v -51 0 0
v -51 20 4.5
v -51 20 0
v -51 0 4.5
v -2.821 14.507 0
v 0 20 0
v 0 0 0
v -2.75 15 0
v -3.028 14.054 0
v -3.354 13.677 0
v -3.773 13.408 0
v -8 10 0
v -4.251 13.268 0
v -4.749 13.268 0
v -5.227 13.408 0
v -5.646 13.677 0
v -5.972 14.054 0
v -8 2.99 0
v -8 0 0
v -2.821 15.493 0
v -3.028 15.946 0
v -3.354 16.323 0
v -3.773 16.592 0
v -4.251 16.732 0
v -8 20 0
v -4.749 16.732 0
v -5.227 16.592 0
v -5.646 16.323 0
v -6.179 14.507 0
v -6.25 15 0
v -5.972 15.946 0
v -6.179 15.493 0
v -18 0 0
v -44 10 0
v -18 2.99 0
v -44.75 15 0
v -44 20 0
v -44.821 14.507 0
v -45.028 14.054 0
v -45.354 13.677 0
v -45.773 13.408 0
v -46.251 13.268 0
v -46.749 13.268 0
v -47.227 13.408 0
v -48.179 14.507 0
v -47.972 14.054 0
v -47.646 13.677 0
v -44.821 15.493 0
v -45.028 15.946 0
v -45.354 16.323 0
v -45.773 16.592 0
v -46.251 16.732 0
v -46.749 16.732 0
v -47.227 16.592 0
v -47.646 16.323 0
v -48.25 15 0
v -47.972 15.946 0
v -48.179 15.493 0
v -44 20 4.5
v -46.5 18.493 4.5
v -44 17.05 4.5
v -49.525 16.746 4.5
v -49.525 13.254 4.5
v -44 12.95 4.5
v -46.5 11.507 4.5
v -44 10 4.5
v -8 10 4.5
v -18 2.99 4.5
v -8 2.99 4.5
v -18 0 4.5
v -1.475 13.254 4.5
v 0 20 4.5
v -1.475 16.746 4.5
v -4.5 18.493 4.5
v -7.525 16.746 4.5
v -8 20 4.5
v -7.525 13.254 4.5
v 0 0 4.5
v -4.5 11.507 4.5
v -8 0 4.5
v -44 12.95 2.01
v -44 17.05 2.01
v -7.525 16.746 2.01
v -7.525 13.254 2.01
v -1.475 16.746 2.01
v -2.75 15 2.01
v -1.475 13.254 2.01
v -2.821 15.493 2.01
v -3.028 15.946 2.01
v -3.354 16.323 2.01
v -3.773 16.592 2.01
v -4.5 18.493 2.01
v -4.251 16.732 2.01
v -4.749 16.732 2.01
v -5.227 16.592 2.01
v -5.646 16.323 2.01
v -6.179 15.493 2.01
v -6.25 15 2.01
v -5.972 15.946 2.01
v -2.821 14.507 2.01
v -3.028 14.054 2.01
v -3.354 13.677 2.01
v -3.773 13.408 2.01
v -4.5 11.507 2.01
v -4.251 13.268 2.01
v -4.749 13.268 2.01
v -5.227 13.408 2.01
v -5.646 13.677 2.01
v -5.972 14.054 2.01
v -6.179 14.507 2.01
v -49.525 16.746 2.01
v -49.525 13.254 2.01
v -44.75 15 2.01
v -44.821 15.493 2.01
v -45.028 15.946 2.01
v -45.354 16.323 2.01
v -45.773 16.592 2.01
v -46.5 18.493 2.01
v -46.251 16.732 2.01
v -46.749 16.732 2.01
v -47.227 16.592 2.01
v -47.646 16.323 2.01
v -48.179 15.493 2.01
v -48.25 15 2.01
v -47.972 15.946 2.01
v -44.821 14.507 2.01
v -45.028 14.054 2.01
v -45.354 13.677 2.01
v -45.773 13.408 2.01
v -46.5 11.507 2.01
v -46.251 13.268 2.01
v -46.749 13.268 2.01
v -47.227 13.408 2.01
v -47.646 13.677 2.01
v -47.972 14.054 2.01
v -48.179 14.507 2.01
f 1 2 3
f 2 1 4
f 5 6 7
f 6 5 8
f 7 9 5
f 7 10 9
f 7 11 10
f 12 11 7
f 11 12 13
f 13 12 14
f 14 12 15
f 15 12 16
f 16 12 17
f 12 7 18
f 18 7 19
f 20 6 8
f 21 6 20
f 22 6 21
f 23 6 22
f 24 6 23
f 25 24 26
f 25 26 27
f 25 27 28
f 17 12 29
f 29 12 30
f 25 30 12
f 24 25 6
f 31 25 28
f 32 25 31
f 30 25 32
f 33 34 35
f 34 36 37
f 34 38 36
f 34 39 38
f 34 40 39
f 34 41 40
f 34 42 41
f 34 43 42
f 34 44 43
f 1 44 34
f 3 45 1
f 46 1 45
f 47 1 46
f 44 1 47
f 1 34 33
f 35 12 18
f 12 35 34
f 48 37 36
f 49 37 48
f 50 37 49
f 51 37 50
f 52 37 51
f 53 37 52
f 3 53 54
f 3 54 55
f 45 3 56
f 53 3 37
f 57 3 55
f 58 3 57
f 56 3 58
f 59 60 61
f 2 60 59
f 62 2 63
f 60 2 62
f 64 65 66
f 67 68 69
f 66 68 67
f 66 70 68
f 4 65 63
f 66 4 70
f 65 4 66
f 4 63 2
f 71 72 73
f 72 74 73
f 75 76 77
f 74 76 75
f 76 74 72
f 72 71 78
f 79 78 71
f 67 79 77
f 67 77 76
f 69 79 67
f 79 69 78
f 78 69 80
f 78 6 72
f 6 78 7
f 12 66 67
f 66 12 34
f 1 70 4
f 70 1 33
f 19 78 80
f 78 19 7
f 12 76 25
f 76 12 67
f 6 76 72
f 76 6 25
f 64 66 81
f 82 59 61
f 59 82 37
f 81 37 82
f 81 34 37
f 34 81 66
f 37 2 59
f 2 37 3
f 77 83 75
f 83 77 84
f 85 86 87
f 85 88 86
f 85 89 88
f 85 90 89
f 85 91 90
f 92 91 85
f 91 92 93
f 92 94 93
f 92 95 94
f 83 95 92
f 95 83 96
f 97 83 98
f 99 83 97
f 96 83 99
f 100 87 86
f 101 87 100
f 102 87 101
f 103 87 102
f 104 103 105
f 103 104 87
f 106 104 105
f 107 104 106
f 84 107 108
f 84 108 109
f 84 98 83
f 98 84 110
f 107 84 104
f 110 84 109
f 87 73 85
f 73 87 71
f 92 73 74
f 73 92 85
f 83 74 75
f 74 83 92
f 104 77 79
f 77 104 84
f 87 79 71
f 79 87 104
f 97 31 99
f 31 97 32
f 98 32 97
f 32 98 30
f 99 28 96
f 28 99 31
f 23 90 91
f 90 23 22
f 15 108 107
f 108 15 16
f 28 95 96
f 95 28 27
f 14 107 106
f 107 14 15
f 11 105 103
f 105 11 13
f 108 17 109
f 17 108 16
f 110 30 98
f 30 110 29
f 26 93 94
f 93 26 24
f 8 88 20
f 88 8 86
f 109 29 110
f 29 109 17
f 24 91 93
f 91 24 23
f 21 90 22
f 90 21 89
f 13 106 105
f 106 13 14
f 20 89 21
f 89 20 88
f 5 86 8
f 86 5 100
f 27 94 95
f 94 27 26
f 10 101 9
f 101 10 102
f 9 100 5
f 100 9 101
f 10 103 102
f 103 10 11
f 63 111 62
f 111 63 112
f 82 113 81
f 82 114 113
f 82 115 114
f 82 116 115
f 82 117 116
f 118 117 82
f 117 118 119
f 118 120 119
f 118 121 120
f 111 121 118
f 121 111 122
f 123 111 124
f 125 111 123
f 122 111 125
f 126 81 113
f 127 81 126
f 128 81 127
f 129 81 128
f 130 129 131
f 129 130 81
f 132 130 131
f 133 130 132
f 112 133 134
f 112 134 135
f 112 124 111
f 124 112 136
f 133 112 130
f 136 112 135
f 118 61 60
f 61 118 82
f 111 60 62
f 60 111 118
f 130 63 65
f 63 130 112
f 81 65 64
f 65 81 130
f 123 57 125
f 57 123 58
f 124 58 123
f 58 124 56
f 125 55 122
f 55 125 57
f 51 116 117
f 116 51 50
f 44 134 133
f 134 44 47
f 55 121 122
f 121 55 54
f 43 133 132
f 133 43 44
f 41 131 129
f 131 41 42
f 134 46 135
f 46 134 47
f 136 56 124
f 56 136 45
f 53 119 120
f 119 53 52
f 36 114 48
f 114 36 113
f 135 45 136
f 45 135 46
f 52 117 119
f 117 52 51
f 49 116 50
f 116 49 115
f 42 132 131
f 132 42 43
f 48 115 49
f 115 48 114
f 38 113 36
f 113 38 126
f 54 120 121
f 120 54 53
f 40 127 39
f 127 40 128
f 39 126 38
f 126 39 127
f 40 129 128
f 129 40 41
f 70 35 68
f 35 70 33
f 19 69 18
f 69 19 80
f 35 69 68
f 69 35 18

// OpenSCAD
// file: nuts.scad
e = 0.1; // epsilon

// Screws / Nuts
// described by a K-Element vector, offsets defined as follows
nut_diameter_low   = 0;
nut_diameter_high  = 1;
nut_height         = 2;
screw_channel      = 3;
screw_head_channel = 4;
screw_head_height  = 5;
m3 = [ 5.6,  6.5, 2.5, 3.5,  6.0, 2.5];
m4 = [ 7.0,  8.0, 3.5, 4.5,  7.5, 3.0];
m5 = [ 8.0,  9.2, 3.7, 5.0,  9.2, 3.5];
m6 = [10.0, 11.2, 5.0, 6.0, 10.1, 4.0];

module nut_hole (nut, h)
{
    w = (nut [nut_diameter_low] + nut [nut_diameter_high]) / 2;
    translate ([0, 0, h / 2]) difference () {
        cube ([w, 2*w, h], center = true);
        rotate ([0, 0, 30])
            translate ([0, 1.5 * w, 0])
                cube ([2*w, 2*w, h+e], center = true);
        rotate ([0, 0, -30])
            translate ([0, 1.5 * w, 0])
                cube ([2*w, 2*w, h+e], center = true);
        rotate ([0, 0, 30])
            translate ([0, -1.5 * w, 0])
                cube ([2*w, 2*w, h+e], center = true);
        rotate ([0, 0, -30])
            translate ([0, -1.5 * w, 0])
                cube ([2*w, 2*w, h+e], center = true);
    }
}

// A screw channel + cone for a sunk screw, with h2 it can be deeper
// h is the length of the screw, h2 is how far it is sunk in the cone
// height/width only depends on the given nut.
module countersunk_screw_hole (nut, h, h2 = 0)
{
    r2 = (nut [screw_channel] * 1.1) / 2;
    cylinder
        ( r1 = (nut [screw_head_channel] * 1.1) / 2
        , r2 = r2
        , h  = nut [screw_head_height]  * 1.05
        );
    cylinder (r = r2, h = h + nut [screw_head_height]);
    translate ([0, 0, -h2+e])
        cylinder (r = nut [screw_head_channel] * 1.1 / 2, h = h2);
}
//translate ([5, 0, 0])
//    countersunk_screw_hole (m5, 10, 10, $fa = 6, $fs = .5);

// A channel for a sideways embedded nut
// ehf is the factor for the embedded height for the hole of the nut, we
// make it a little wider than nut-height by default, but it can be
// overridden.
// ewf is the factor for the width of the hole (nut diameter * ewf)
module embedded_nut (nut, h, ehf=1.3, ewf=1)
{
    w = (nut [nut_diameter_low] + nut [nut_diameter_high]) / 2;
    union () {
        translate ([0, -w * ewf * 0.5, 0])
            cube ([nut [nut_height] * ehf, w * ewf, h]);
        rotate ([0, 90, 0]) rotate ([0, 0, 30])
            nut_hole (nut, nut [nut_height] * ehf);
    }
}
//embedded_nut (m3, 20);
// main file
include <nuts.scad>;

eps = 0.01;

module opy_mount
    (l=42, d=5, wl=3.5, wr=2.5, wo=4.5, h=10, t=2, cw=10, ch=3, nut=m3)
{
    nh = nut [nut_height];
    sc = nut [screw_channel];
    tt = t + nh;
    ll = l+2*wo;
    hh = h + 2*d;
    translate ([0, 0, tt]) rotate ([0, 180, 0]) difference () {
        union () {
            cube ([ll, h, tt]);
            cube ([wl+wo, hh, tt]);
            translate ([ll-(wr+wo), 0, 0])
                cube ([wr+wo, hh, tt]);
        }
        translate ([wo, h+d, -eps]) {
            translate ([0, 0, -nh])
                cylinder (r = sc / 2, h = 5 * nh);
            nut_hole (nut, nh);
        }
        translate ([ll-wo, h+d, -eps]) {
            translate ([0, 0, -nh])
                cylinder (r = sc / 2, h = 5 * nh);
            nut_hole (nut, nh);
        }
        translate ([wl+wo, -eps, -tt])
            cube ([cw, ch, 3*tt]);
    }
}

opy_mount ($fa = 2, $fs = .5);
